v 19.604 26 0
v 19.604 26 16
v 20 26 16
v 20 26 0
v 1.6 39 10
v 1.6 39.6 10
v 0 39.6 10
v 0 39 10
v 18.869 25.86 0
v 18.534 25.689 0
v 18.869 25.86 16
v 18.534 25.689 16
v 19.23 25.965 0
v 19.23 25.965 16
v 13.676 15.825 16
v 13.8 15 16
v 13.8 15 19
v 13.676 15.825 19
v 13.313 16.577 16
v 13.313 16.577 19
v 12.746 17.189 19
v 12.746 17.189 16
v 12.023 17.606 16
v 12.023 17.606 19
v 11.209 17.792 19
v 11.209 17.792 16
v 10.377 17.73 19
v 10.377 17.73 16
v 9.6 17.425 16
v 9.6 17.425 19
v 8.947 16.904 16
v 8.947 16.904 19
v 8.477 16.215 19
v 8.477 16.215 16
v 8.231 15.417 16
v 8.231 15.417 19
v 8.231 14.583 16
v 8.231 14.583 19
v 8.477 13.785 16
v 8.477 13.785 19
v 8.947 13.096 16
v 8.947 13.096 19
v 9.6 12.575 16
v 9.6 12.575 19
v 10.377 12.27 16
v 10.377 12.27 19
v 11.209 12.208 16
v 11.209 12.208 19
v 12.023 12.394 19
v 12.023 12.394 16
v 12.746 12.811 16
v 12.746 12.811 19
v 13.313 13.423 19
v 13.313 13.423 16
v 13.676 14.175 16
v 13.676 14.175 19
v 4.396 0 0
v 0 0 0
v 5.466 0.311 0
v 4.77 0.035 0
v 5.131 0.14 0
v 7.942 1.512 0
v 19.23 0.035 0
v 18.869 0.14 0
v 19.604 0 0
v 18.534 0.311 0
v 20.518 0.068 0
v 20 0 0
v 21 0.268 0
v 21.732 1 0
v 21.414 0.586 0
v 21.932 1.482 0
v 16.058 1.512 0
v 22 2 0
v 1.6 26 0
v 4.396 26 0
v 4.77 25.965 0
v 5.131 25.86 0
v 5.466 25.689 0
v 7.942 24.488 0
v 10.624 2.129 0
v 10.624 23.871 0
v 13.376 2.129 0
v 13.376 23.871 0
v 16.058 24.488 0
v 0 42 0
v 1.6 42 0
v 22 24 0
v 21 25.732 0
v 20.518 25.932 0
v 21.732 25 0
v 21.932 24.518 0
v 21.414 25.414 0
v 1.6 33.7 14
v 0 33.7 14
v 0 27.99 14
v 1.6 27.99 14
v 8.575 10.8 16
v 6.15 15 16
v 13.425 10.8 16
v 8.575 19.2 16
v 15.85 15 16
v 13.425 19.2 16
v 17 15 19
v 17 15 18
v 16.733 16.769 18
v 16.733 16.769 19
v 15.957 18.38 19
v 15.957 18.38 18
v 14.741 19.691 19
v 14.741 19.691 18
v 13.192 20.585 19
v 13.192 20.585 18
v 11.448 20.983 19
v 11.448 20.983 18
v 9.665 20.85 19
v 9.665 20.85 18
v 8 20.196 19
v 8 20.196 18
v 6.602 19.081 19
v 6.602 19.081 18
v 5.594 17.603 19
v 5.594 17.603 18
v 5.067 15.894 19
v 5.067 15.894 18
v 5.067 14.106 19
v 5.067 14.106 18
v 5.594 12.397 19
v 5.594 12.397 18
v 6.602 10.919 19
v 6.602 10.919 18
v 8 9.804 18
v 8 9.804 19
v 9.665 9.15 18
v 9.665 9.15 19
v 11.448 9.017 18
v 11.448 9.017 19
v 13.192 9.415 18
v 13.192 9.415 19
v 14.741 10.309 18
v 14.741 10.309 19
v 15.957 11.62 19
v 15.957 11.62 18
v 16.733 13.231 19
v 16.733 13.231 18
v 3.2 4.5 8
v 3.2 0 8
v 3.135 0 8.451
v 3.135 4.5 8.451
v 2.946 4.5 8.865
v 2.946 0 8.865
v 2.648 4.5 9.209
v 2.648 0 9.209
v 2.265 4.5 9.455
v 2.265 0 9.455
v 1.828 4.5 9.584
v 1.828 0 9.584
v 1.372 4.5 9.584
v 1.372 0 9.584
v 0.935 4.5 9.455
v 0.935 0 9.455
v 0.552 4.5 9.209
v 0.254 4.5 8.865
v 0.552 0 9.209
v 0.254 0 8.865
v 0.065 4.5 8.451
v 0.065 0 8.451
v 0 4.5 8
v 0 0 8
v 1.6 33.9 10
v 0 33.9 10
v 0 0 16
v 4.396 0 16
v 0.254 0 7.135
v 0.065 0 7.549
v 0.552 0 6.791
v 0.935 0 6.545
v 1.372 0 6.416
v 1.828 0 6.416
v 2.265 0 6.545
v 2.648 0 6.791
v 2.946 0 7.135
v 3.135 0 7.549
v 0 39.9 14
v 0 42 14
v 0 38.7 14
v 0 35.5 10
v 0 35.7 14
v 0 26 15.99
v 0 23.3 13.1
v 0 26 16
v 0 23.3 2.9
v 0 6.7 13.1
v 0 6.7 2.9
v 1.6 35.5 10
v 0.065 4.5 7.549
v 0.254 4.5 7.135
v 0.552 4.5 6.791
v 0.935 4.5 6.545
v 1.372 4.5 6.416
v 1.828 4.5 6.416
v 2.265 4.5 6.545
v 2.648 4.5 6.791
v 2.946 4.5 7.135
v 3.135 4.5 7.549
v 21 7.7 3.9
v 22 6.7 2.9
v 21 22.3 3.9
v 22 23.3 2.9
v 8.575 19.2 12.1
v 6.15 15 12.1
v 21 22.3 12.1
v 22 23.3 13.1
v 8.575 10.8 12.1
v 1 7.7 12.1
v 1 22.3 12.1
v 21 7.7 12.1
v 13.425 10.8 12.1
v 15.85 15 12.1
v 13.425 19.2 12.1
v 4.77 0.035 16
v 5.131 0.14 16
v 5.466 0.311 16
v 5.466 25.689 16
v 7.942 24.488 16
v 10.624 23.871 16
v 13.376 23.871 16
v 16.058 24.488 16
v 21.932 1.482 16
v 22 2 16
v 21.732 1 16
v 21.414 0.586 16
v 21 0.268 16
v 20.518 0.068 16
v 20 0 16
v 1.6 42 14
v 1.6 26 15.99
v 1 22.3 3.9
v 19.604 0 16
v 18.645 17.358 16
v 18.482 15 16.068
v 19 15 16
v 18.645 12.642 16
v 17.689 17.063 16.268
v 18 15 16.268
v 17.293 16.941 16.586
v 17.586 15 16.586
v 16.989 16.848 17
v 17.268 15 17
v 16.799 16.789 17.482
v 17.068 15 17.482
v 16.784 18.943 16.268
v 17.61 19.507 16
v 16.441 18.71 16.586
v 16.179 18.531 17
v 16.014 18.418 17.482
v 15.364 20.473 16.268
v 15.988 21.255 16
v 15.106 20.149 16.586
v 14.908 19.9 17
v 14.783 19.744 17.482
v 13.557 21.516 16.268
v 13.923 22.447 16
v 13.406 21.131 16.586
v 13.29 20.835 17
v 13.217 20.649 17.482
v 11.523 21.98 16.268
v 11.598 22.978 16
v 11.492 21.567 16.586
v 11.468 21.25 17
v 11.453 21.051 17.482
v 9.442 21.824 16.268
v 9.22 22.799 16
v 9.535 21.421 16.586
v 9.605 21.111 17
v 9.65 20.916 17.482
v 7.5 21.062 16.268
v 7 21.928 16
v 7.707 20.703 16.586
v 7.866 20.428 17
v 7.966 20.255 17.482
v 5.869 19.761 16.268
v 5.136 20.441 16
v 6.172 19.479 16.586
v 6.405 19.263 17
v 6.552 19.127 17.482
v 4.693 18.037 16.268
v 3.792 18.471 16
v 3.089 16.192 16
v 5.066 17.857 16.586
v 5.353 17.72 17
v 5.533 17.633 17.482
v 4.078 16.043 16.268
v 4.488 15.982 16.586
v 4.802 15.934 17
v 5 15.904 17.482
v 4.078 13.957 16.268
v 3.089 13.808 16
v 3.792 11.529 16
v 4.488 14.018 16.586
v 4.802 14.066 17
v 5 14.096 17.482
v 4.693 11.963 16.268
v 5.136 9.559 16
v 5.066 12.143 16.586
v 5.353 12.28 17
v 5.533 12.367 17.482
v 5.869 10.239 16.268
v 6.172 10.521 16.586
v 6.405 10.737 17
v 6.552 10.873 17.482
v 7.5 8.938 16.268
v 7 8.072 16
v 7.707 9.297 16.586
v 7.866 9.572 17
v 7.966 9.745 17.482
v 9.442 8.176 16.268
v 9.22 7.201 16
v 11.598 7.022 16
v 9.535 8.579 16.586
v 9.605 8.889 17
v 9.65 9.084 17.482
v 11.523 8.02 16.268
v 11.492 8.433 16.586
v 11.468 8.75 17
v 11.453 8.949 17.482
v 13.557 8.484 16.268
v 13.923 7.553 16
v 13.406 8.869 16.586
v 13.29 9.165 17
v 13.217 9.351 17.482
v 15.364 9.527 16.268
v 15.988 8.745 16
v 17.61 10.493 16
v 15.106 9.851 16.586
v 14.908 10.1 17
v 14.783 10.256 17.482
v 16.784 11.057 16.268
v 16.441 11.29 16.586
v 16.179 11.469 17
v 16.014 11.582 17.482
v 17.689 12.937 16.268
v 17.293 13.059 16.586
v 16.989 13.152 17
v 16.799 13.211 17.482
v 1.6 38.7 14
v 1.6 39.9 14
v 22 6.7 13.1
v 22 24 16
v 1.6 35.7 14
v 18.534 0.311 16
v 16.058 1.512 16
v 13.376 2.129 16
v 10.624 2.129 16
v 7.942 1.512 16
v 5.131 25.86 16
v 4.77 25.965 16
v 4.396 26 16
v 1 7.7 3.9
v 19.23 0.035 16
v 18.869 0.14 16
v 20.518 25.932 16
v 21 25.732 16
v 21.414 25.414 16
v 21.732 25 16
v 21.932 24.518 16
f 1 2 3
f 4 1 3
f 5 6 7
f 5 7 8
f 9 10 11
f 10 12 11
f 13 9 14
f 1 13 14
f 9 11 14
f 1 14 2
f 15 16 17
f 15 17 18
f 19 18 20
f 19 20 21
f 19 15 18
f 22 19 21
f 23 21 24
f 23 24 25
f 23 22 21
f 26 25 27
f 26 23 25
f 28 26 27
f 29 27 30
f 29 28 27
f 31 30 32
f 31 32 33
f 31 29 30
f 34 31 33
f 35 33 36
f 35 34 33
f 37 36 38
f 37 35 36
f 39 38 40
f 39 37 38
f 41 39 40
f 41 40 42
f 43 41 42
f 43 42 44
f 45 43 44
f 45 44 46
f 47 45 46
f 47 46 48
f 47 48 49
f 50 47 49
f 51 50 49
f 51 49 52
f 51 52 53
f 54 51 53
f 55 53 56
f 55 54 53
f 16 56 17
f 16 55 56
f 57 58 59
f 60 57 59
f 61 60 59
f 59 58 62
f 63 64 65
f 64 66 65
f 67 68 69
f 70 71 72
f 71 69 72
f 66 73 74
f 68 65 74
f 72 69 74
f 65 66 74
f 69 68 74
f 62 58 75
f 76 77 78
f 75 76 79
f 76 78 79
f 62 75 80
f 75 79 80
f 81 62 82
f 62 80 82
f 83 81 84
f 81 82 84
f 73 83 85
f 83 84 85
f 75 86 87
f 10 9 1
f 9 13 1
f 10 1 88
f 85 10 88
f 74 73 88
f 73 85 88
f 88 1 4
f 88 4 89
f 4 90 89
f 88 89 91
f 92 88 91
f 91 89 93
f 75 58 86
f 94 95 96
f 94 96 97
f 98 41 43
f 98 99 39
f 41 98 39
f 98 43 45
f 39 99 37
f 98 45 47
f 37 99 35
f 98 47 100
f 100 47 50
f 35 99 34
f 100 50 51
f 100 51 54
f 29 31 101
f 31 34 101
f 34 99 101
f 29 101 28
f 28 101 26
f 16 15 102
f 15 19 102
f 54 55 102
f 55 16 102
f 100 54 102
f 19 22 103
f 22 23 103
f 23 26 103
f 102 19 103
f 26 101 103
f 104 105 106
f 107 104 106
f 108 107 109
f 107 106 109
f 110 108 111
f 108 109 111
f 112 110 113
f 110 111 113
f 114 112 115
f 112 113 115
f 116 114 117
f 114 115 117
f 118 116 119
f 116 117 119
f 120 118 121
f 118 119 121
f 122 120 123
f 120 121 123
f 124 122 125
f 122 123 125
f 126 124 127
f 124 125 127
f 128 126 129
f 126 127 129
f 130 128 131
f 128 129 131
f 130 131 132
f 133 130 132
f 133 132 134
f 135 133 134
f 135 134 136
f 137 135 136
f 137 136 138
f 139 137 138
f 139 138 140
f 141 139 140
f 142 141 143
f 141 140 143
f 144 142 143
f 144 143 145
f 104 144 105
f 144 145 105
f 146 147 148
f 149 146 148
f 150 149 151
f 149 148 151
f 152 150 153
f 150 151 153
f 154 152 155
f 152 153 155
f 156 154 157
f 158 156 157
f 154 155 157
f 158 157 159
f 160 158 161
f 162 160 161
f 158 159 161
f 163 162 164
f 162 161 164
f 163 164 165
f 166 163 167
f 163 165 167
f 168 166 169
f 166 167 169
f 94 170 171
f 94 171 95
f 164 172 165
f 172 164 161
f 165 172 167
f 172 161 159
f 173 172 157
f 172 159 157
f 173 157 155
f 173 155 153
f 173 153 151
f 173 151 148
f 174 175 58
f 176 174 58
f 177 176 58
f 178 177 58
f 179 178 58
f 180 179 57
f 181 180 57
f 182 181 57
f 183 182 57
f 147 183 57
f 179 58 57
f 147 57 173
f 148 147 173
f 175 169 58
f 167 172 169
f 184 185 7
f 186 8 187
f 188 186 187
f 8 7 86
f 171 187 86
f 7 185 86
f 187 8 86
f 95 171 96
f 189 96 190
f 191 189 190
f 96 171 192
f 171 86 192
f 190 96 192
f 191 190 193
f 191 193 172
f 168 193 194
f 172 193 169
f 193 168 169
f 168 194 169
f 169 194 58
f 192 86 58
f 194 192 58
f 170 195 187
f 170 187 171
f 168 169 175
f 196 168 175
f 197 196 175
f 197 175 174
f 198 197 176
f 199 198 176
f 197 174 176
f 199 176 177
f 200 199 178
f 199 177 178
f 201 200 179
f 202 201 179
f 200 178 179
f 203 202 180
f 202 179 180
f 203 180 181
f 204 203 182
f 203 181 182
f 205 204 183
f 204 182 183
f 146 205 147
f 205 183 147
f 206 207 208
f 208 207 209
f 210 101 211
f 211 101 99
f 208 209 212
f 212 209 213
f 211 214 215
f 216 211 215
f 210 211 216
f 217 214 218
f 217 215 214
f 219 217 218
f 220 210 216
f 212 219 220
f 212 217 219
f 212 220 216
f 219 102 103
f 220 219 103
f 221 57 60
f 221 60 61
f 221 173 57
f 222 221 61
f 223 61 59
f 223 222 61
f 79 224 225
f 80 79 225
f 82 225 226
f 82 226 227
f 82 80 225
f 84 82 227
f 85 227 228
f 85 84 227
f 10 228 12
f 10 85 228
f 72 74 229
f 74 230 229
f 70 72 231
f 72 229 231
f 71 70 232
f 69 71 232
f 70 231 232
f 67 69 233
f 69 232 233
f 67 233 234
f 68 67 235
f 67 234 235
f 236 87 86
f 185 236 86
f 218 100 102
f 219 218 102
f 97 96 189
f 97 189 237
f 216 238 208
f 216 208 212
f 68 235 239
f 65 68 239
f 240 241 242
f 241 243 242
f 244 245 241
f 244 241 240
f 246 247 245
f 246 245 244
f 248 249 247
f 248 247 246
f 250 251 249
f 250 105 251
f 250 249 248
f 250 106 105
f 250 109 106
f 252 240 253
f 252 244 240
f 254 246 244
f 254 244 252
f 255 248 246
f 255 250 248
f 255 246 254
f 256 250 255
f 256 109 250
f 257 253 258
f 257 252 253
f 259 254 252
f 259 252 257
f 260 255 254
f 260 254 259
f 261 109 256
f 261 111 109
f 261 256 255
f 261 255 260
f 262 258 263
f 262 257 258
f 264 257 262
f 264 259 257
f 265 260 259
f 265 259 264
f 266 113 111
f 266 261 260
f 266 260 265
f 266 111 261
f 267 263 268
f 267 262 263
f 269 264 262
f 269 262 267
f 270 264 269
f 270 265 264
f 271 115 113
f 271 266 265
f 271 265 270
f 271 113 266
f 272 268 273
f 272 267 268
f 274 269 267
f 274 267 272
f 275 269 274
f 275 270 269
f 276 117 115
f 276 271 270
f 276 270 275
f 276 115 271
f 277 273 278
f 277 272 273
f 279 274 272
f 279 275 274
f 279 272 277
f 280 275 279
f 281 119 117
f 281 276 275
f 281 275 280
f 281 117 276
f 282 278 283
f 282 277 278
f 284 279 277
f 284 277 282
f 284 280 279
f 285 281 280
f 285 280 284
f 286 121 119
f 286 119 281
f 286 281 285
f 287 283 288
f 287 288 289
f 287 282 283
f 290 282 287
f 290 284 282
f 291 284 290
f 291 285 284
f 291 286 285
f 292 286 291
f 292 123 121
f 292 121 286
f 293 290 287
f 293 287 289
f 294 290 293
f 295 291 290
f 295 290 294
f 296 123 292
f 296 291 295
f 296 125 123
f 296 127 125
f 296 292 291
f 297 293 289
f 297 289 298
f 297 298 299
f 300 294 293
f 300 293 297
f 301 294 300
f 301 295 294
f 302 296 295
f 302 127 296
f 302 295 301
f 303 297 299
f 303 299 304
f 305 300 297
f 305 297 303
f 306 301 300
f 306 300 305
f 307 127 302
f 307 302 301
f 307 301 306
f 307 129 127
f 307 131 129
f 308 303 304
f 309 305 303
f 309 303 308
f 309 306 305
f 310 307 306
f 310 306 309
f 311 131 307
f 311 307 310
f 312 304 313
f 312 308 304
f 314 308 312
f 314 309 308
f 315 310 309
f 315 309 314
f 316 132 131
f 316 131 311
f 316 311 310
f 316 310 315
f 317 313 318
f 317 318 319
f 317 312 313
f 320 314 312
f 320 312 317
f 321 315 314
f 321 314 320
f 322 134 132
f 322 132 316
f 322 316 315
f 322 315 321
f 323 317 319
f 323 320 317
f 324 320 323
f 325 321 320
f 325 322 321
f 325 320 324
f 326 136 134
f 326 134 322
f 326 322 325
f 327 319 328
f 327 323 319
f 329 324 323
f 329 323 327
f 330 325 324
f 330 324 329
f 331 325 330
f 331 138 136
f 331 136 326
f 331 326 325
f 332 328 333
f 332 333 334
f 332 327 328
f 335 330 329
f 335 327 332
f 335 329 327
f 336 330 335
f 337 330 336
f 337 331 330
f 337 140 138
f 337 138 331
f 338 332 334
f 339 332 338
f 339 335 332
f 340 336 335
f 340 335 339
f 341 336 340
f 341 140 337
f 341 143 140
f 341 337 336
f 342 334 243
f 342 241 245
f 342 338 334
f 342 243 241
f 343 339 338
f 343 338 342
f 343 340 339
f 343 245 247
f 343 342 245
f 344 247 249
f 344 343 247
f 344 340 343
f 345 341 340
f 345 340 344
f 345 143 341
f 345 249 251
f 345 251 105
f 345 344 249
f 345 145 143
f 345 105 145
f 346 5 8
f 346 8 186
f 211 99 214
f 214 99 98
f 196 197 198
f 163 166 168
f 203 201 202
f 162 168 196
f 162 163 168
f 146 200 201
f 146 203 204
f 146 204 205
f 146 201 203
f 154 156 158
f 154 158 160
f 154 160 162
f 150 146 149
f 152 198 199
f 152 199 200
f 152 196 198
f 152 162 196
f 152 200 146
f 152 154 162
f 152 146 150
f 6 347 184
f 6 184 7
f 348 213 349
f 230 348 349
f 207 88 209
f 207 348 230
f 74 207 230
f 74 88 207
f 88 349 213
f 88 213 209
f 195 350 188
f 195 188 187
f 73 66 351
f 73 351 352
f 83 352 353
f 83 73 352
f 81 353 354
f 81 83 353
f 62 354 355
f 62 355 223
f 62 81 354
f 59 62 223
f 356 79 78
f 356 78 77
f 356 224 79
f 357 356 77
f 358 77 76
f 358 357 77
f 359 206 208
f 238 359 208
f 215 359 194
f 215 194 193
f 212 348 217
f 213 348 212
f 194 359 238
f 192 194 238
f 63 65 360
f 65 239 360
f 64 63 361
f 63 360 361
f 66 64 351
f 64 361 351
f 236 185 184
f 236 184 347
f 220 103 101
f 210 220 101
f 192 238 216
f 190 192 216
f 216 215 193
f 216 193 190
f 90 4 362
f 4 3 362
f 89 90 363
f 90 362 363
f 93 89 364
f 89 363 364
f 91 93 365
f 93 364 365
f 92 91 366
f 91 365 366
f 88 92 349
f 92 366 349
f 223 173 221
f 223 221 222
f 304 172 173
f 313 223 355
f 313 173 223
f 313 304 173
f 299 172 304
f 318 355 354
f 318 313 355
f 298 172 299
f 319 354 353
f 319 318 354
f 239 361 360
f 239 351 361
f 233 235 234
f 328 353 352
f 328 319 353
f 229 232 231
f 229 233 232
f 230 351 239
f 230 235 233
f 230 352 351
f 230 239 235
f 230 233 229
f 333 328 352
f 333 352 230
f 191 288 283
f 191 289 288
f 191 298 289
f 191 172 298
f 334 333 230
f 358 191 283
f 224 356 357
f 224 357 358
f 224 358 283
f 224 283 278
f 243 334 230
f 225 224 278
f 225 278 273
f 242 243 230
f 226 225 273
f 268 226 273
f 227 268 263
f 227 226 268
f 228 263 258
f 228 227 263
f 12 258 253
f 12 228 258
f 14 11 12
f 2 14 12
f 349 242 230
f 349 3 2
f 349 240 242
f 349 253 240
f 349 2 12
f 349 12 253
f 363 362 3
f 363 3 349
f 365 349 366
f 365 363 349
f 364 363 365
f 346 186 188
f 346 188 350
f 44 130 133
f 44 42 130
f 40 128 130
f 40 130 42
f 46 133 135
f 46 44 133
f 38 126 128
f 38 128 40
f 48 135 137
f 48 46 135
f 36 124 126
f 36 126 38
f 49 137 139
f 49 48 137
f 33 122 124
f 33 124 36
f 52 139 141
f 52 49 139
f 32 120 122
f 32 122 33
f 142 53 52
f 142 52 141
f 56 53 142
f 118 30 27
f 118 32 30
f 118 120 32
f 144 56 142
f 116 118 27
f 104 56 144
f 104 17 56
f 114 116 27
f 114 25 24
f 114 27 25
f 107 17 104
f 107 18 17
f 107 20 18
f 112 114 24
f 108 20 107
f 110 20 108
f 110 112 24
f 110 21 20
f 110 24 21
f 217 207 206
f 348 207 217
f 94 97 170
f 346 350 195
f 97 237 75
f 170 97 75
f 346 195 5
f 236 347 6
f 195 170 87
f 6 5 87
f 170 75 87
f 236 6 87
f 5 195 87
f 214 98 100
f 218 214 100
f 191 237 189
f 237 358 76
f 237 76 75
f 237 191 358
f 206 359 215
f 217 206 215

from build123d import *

# Parameters (mm, degrees)
PAD_DEPTH       = 16
SKETCH001_W     = 14.6
SKETCH001_H     = 8.2
POCKET_DEPTH    = 22.001
SKETCH002_W     = 1.6
SKETCH002_H     = 16
POCKET001_DEPTH = 2
CHAMFER_SIZE    = 1.99
POCKET002_DEPTH = 1.601
SKETCH005_R     = 6
SKETCH005_R_2   = 2.8
PAD001_DEPTH    = 3
POCKET003_DEPTH = 7
FILLET_R        = 2
FILLET001_R     = 2
CHAMFER001_SIZE = 1
CHAMFER002_SIZE = 1
SKETCH007_R     = 1.6
POCKET004_DEPTH = 4.5


with BuildPart() as part:
    # Sketch → Pad (new body)
    with BuildSketch(Plane.XY):
        with BuildLine():
            Line((5, 26), (1.6, 26))
            Line((1.6, 26), (1.6, 42))
            Line((1.6, 42), (0, 42))
            Line((0, 42), (0, 0))
            Line((0, 0), (5, 0))
            ThreePointArc((19, 0), (12, 2.206556), (5, 0))
            Line((22, 0), (19, 0))
            Line((22, 26), (22, 0))
            Line((19, 26), (22, 26))
            ThreePointArc((5, 26), (12, 23.793444), (19, 26))
        make_face()
    extrude(amount=PAD_DEPTH)

    # Sketch001 (on Face9 of Pad) → Pocket (cut, through all)
    with BuildSketch(Plane.YZ.offset(22)):
        with Locations((15, 8)):
            Rectangle(SKETCH001_W, SKETCH001_H)
    extrude(amount=-POCKET_DEPTH, mode=Mode.SUBTRACT)

    # Sketch002 (on DatumPlane) → Pocket001 (cut)
    with BuildSketch(Plane.XY.offset(16)):
        with Locations((0.8, 34)):
            Rectangle(SKETCH002_W, SKETCH002_H)
    extrude(amount=-POCKET001_DEPTH, mode=Mode.SUBTRACT)

    # Chamfer
    chamfer_edges = [part.edges().sort_by_distance(p)[0] for p in [
        (0.8, 26, 14),
    ]]
    chamfer(chamfer_edges, length=CHAMFER_SIZE)

    # Sketch003 (on DatumPlane) → Pocket002 (cut, through all)
    with BuildSketch(Plane.YZ.offset(1.6)):
        Polygon((33.7, 14), (35.7, 14), (35.5, 10), (33.9, 10), align=None)
        Polygon((38.7, 14), (39.9, 14), (39.6, 10), (39, 10), align=None)
    extrude(amount=-POCKET002_DEPTH, mode=Mode.SUBTRACT)

    # Sketch005 (on DatumPlane) → Pad001 (join)
    with BuildSketch(Plane.XY.offset(16)):
        with Locations((11, 15)):
            Circle(SKETCH005_R)
        with Locations((11, 15)):
            Circle(SKETCH005_R_2, mode=Mode.SUBTRACT)
    extrude(amount=PAD001_DEPTH)

    # Sketch006 (on DatumPlane) → Pocket003 (cut)
    with BuildSketch(Plane.XY.offset(16)):
        Polygon((15.849742, 15), (13.424871, 19.2), (8.575129, 19.2), (6.150258, 15), (8.575129, 10.8), (13.424871, 10.8), align=None)
    extrude(amount=-POCKET003_DEPTH, mode=Mode.SUBTRACT)

    # Fillet
    fillet_edges = [part.edges().sort_by_distance(p)[0] for p in [
        (5, 15, 16),
    ]]
    fillet(fillet_edges, radius=FILLET_R)

    # Fillet001
    fillet001_edges = [part.edges().sort_by_distance(p)[0] for p in [
        (22, 26, 8),
        (19, 26, 8),
        (5, 26, 8),
        (22, 0, 8),
        (19, 0, 8),
        (5, 0, 8),
    ]]
    fillet(fillet001_edges, radius=FILLET001_R)

    # Chamfer001
    chamfer001_edges = [part.edges().sort_by_distance(p)[0] for p in [
        (0, 15, 12.1),
        (0, 15, 3.9),
        (0, 7.7, 8),
        (0, 22.3, 8),
    ]]
    chamfer(chamfer001_edges, length=CHAMFER001_SIZE)

    # Chamfer002
    chamfer002_edges = [part.edges().sort_by_distance(p)[0] for p in [
        (22, 22.3, 8),
        (22, 15, 12.1),
        (22, 7.7, 8),
        (22, 15, 3.9),
    ]]
    chamfer(chamfer002_edges, length=CHAMFER002_SIZE)

    # Sketch007 (on DatumPlane) → Pocket004 (cut)
    with BuildSketch(Plane.XZ):
        with Locations((1.6, 8)):
            Circle(SKETCH007_R)
    extrude(amount=-POCKET004_DEPTH, mode=Mode.SUBTRACT)


solid = part.part
